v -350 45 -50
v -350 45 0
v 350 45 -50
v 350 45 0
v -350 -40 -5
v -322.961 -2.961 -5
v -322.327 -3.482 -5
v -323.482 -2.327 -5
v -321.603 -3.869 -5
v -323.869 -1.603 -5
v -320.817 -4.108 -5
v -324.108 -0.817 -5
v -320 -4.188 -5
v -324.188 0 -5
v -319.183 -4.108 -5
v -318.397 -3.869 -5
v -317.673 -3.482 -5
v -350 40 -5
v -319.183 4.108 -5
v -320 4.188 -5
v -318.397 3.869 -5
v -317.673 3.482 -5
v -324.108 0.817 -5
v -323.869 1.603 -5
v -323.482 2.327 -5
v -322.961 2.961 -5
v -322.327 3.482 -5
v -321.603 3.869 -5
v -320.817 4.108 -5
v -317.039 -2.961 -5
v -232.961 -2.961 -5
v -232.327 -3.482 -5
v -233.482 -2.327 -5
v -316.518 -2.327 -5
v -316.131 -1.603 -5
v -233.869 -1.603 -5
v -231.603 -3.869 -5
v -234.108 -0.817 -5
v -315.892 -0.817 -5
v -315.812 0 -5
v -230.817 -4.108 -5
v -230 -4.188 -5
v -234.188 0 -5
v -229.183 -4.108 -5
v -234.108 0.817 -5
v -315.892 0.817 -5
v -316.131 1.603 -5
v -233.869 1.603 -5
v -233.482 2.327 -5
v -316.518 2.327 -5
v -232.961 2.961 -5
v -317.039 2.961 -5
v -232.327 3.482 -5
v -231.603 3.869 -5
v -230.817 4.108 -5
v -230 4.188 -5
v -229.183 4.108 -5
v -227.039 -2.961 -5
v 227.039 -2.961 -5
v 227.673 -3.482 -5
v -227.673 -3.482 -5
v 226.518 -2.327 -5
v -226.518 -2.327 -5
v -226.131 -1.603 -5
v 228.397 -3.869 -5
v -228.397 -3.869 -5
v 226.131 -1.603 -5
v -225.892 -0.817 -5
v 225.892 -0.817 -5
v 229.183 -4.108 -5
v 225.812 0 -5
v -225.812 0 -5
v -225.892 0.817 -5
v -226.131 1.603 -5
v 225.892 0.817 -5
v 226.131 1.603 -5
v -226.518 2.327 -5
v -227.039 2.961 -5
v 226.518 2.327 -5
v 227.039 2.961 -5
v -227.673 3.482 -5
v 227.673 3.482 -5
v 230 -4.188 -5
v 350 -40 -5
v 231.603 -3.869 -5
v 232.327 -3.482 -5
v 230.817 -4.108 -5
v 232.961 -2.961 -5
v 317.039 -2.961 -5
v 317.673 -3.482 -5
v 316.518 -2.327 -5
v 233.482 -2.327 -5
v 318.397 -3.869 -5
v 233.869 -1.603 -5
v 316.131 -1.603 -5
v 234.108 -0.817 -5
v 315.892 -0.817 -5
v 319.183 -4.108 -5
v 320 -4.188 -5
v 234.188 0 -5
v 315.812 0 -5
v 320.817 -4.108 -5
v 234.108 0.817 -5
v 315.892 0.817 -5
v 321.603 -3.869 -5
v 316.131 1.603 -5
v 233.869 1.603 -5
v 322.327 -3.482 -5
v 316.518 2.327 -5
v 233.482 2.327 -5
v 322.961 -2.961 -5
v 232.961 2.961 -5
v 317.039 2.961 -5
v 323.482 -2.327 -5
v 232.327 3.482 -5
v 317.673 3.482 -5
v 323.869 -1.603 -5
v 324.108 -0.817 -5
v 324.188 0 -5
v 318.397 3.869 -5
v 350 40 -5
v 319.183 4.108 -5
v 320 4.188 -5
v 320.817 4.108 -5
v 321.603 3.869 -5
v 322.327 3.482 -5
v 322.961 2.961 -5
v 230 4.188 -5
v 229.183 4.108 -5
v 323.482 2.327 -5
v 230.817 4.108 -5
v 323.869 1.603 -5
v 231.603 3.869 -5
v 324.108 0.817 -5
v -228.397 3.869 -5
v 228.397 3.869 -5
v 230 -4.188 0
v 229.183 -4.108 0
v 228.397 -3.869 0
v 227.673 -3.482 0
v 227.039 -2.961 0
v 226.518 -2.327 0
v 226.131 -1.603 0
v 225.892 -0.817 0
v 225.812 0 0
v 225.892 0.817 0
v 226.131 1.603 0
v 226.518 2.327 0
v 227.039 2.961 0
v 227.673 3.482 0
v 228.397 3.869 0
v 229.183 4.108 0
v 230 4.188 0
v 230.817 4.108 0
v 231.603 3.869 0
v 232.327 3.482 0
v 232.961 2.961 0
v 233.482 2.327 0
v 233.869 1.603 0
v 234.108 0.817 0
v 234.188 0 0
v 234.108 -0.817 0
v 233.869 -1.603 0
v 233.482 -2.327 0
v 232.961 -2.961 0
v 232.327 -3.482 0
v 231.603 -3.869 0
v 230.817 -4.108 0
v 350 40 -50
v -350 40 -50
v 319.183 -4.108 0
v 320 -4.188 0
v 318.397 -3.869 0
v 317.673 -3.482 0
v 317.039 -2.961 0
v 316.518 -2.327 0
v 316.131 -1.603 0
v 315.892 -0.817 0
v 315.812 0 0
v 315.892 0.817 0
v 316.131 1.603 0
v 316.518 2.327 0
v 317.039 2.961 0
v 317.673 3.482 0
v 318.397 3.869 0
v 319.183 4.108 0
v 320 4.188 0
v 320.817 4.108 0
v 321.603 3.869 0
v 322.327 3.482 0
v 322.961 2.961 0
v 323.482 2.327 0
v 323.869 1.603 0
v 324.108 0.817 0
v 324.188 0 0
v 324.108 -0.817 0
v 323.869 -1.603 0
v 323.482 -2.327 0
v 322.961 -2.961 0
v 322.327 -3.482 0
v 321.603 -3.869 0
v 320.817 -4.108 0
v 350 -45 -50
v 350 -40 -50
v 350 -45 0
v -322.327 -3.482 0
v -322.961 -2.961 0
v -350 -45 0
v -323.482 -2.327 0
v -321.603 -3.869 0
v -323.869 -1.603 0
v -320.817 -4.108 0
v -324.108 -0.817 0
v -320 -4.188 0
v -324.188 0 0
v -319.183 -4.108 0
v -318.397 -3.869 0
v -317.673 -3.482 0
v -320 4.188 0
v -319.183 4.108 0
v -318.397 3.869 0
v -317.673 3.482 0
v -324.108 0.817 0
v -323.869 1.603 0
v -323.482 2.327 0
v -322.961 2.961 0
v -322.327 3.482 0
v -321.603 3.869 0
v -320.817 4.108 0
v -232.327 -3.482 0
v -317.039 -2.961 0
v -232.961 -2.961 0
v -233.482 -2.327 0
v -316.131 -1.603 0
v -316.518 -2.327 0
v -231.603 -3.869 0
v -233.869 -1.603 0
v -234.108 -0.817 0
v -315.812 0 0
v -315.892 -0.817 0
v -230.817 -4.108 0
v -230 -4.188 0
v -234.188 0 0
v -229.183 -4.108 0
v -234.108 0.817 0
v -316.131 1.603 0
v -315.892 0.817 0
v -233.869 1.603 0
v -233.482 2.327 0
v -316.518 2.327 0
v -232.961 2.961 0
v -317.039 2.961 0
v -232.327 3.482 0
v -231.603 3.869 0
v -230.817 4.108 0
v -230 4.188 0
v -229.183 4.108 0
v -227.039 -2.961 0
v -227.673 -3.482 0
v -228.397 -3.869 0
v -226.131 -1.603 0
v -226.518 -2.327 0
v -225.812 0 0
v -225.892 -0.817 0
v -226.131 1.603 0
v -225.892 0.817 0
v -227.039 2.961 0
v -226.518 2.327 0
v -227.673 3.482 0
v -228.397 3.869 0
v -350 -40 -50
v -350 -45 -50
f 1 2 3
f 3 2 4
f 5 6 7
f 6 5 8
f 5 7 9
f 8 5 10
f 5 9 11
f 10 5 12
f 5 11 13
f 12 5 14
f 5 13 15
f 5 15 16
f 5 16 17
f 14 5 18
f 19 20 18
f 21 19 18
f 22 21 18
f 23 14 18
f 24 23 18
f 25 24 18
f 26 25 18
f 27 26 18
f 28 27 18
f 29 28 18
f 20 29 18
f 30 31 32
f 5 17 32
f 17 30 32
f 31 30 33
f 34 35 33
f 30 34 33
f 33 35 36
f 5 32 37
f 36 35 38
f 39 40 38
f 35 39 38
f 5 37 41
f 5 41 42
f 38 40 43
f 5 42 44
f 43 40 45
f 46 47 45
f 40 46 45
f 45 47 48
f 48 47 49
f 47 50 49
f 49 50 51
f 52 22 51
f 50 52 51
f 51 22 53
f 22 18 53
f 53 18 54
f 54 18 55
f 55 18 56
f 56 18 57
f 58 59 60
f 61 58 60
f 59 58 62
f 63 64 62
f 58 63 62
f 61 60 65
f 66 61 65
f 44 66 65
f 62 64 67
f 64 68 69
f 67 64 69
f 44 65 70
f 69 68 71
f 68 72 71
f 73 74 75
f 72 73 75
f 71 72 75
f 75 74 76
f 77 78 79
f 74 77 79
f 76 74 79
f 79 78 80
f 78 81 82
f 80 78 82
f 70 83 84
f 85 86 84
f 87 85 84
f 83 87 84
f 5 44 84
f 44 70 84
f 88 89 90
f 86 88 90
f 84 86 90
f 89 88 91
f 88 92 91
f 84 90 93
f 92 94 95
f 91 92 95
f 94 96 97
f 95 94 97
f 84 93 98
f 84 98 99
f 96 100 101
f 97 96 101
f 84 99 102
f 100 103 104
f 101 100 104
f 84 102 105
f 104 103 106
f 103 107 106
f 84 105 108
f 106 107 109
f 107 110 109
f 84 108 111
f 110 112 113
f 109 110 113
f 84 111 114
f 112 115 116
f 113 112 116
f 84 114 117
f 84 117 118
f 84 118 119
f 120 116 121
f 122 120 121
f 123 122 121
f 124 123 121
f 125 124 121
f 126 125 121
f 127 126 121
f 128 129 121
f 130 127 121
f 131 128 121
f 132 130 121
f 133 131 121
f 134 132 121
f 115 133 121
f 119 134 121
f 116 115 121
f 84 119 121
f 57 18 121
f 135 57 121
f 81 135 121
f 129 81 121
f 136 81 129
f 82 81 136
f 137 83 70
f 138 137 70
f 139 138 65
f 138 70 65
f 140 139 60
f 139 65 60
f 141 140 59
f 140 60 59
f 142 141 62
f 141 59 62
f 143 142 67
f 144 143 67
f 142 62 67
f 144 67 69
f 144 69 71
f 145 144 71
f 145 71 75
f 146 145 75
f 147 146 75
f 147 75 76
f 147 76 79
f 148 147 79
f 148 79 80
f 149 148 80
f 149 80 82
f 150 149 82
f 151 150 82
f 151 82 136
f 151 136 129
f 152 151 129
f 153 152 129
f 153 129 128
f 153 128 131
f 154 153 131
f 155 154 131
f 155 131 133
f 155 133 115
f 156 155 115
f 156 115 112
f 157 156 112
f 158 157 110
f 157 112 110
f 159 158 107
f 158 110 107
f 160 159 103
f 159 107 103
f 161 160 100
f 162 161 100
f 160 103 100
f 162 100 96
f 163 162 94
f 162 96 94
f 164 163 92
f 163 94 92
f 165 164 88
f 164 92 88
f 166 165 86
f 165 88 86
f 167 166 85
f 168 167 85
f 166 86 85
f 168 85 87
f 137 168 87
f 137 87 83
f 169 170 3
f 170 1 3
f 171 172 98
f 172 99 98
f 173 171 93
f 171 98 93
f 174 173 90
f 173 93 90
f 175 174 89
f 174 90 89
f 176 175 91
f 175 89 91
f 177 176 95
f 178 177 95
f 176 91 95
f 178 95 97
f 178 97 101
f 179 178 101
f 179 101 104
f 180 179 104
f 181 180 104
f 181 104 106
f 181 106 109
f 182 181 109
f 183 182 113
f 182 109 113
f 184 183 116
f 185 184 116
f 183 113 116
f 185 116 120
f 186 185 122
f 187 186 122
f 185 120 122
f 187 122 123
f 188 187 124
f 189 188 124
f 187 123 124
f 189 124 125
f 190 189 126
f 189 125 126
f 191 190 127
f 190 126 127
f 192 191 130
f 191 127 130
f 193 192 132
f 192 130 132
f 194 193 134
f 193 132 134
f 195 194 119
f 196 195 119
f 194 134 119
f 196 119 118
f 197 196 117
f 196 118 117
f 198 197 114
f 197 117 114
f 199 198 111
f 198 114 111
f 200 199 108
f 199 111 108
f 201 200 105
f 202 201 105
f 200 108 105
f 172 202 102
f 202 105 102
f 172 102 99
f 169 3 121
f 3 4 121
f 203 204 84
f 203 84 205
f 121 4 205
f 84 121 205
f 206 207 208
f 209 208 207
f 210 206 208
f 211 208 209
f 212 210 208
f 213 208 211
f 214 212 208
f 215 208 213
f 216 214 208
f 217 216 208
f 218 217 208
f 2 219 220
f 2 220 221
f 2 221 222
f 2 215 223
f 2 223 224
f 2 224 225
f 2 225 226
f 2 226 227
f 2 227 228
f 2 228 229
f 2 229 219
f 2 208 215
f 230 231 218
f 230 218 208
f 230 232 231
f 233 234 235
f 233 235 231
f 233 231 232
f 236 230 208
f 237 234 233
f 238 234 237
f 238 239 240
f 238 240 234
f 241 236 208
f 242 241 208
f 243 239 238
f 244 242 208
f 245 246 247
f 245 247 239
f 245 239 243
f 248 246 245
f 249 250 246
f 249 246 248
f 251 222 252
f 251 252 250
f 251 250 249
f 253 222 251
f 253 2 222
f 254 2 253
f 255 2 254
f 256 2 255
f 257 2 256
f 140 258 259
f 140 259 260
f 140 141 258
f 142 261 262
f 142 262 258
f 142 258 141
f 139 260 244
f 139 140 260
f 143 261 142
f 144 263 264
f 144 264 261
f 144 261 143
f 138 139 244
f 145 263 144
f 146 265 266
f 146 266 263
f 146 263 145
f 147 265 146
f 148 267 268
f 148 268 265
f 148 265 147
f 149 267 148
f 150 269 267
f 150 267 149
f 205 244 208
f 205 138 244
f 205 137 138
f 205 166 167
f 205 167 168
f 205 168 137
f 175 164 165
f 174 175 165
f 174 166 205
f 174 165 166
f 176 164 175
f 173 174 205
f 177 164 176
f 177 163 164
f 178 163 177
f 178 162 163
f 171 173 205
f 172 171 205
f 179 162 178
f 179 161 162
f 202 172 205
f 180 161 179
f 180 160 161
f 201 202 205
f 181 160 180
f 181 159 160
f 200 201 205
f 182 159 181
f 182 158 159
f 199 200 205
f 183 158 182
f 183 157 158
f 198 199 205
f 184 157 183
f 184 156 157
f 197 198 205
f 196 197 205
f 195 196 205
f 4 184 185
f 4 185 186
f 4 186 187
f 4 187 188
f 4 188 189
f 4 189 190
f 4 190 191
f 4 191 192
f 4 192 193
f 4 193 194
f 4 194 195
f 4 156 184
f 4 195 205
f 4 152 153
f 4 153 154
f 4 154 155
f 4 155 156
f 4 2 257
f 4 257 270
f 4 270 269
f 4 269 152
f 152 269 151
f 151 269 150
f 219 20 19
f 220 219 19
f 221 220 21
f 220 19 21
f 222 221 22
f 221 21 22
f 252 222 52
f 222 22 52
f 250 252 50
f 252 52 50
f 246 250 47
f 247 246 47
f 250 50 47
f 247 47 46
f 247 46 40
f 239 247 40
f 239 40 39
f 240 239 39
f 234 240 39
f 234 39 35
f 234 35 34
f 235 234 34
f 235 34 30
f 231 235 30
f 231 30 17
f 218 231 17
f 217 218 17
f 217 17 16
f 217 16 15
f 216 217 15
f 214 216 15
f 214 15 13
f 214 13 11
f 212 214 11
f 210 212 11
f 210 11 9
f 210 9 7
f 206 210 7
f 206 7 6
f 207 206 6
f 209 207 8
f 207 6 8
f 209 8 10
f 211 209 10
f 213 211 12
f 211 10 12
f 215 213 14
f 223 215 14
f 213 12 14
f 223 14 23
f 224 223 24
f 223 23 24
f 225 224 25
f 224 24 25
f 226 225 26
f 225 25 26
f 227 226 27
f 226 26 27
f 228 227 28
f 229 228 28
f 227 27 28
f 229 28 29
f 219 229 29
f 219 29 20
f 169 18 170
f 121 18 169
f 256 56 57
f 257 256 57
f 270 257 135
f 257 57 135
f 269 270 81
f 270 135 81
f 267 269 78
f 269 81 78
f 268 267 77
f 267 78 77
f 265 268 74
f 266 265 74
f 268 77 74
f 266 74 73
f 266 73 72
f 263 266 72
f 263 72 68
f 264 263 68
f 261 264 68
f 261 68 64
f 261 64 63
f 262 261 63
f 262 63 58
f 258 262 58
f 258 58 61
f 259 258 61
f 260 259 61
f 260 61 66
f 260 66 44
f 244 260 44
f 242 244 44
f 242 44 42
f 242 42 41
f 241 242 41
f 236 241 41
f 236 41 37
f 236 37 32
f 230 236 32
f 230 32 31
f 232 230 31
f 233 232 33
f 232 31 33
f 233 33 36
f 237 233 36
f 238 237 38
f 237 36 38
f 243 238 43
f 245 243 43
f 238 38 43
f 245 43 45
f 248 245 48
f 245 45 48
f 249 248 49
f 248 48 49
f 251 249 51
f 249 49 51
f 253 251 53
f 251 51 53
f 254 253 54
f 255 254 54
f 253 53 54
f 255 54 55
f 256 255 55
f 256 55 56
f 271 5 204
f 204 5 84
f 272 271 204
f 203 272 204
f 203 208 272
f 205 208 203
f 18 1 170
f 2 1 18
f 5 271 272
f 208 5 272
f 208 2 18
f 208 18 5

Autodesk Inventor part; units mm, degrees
ref_plane "YZ Plane" through (0, 0, 0) normal (1, 0, 0) x (0, 1, 0)
ref_plane "XZ Plane" through (0, 0, 0) normal (0, 1, 0) x (-1, 0, 0)
ref_plane "XY Plane" through (0, 0, 0) normal (0, 0, 1) x (1, 0, 0)
sketch "Sketch1" plane through (0, 0, 0) normal (0, 0, 1) x (1, 0, 0)
  line L0 (-350, 45) -> (350, 45)
  line L1 (-350, -45) -> (350, -45)
  line L2 (-350, 45) -> (-350, -45)
  line L3 (350, 45) -> (350, -45)
  line L4 (350, -45) -> (-350, 45) construction
  line L5 (-350, -45) -> (350, 45) construction
  point P0 (0, 0)
  point P1 (0, 0)
  dimension "d8" = 700
  dimension "d9" = 90
extrude "Extrusion1" add sketch "Sketch1" against normal blind 50
shell "Shell1" thickness 5 removed faces 3 at (350, 15, -16.6667) at (-350, -15, -16.6667) at (116.6667, 15, -50)
sketch "Sketch3" plane through (0, 0, 0) normal (0, 0, 1) x (1, 0, 0)
  point P0 (0, 0)
  point P1 (320, 0)
  point P2 (230, 0)
  dimension "d11" = 320
  dimension "d12" = 90
hole "Hole1" at (320, 0, 0) at (230, 0, 0) direction (0, 0, -1) diameter 8.376 end through all thread size "M10x1.5" class "6H" standard "ANSI Metric M Profile"
pattern_circular "Circular Pattern1" count 2 over 360 about axis through (0, 0, -10) along (0, 0, 1) of "Hole1"
properties part number "ADSK-MH-10011" material "Steel, Mild"
